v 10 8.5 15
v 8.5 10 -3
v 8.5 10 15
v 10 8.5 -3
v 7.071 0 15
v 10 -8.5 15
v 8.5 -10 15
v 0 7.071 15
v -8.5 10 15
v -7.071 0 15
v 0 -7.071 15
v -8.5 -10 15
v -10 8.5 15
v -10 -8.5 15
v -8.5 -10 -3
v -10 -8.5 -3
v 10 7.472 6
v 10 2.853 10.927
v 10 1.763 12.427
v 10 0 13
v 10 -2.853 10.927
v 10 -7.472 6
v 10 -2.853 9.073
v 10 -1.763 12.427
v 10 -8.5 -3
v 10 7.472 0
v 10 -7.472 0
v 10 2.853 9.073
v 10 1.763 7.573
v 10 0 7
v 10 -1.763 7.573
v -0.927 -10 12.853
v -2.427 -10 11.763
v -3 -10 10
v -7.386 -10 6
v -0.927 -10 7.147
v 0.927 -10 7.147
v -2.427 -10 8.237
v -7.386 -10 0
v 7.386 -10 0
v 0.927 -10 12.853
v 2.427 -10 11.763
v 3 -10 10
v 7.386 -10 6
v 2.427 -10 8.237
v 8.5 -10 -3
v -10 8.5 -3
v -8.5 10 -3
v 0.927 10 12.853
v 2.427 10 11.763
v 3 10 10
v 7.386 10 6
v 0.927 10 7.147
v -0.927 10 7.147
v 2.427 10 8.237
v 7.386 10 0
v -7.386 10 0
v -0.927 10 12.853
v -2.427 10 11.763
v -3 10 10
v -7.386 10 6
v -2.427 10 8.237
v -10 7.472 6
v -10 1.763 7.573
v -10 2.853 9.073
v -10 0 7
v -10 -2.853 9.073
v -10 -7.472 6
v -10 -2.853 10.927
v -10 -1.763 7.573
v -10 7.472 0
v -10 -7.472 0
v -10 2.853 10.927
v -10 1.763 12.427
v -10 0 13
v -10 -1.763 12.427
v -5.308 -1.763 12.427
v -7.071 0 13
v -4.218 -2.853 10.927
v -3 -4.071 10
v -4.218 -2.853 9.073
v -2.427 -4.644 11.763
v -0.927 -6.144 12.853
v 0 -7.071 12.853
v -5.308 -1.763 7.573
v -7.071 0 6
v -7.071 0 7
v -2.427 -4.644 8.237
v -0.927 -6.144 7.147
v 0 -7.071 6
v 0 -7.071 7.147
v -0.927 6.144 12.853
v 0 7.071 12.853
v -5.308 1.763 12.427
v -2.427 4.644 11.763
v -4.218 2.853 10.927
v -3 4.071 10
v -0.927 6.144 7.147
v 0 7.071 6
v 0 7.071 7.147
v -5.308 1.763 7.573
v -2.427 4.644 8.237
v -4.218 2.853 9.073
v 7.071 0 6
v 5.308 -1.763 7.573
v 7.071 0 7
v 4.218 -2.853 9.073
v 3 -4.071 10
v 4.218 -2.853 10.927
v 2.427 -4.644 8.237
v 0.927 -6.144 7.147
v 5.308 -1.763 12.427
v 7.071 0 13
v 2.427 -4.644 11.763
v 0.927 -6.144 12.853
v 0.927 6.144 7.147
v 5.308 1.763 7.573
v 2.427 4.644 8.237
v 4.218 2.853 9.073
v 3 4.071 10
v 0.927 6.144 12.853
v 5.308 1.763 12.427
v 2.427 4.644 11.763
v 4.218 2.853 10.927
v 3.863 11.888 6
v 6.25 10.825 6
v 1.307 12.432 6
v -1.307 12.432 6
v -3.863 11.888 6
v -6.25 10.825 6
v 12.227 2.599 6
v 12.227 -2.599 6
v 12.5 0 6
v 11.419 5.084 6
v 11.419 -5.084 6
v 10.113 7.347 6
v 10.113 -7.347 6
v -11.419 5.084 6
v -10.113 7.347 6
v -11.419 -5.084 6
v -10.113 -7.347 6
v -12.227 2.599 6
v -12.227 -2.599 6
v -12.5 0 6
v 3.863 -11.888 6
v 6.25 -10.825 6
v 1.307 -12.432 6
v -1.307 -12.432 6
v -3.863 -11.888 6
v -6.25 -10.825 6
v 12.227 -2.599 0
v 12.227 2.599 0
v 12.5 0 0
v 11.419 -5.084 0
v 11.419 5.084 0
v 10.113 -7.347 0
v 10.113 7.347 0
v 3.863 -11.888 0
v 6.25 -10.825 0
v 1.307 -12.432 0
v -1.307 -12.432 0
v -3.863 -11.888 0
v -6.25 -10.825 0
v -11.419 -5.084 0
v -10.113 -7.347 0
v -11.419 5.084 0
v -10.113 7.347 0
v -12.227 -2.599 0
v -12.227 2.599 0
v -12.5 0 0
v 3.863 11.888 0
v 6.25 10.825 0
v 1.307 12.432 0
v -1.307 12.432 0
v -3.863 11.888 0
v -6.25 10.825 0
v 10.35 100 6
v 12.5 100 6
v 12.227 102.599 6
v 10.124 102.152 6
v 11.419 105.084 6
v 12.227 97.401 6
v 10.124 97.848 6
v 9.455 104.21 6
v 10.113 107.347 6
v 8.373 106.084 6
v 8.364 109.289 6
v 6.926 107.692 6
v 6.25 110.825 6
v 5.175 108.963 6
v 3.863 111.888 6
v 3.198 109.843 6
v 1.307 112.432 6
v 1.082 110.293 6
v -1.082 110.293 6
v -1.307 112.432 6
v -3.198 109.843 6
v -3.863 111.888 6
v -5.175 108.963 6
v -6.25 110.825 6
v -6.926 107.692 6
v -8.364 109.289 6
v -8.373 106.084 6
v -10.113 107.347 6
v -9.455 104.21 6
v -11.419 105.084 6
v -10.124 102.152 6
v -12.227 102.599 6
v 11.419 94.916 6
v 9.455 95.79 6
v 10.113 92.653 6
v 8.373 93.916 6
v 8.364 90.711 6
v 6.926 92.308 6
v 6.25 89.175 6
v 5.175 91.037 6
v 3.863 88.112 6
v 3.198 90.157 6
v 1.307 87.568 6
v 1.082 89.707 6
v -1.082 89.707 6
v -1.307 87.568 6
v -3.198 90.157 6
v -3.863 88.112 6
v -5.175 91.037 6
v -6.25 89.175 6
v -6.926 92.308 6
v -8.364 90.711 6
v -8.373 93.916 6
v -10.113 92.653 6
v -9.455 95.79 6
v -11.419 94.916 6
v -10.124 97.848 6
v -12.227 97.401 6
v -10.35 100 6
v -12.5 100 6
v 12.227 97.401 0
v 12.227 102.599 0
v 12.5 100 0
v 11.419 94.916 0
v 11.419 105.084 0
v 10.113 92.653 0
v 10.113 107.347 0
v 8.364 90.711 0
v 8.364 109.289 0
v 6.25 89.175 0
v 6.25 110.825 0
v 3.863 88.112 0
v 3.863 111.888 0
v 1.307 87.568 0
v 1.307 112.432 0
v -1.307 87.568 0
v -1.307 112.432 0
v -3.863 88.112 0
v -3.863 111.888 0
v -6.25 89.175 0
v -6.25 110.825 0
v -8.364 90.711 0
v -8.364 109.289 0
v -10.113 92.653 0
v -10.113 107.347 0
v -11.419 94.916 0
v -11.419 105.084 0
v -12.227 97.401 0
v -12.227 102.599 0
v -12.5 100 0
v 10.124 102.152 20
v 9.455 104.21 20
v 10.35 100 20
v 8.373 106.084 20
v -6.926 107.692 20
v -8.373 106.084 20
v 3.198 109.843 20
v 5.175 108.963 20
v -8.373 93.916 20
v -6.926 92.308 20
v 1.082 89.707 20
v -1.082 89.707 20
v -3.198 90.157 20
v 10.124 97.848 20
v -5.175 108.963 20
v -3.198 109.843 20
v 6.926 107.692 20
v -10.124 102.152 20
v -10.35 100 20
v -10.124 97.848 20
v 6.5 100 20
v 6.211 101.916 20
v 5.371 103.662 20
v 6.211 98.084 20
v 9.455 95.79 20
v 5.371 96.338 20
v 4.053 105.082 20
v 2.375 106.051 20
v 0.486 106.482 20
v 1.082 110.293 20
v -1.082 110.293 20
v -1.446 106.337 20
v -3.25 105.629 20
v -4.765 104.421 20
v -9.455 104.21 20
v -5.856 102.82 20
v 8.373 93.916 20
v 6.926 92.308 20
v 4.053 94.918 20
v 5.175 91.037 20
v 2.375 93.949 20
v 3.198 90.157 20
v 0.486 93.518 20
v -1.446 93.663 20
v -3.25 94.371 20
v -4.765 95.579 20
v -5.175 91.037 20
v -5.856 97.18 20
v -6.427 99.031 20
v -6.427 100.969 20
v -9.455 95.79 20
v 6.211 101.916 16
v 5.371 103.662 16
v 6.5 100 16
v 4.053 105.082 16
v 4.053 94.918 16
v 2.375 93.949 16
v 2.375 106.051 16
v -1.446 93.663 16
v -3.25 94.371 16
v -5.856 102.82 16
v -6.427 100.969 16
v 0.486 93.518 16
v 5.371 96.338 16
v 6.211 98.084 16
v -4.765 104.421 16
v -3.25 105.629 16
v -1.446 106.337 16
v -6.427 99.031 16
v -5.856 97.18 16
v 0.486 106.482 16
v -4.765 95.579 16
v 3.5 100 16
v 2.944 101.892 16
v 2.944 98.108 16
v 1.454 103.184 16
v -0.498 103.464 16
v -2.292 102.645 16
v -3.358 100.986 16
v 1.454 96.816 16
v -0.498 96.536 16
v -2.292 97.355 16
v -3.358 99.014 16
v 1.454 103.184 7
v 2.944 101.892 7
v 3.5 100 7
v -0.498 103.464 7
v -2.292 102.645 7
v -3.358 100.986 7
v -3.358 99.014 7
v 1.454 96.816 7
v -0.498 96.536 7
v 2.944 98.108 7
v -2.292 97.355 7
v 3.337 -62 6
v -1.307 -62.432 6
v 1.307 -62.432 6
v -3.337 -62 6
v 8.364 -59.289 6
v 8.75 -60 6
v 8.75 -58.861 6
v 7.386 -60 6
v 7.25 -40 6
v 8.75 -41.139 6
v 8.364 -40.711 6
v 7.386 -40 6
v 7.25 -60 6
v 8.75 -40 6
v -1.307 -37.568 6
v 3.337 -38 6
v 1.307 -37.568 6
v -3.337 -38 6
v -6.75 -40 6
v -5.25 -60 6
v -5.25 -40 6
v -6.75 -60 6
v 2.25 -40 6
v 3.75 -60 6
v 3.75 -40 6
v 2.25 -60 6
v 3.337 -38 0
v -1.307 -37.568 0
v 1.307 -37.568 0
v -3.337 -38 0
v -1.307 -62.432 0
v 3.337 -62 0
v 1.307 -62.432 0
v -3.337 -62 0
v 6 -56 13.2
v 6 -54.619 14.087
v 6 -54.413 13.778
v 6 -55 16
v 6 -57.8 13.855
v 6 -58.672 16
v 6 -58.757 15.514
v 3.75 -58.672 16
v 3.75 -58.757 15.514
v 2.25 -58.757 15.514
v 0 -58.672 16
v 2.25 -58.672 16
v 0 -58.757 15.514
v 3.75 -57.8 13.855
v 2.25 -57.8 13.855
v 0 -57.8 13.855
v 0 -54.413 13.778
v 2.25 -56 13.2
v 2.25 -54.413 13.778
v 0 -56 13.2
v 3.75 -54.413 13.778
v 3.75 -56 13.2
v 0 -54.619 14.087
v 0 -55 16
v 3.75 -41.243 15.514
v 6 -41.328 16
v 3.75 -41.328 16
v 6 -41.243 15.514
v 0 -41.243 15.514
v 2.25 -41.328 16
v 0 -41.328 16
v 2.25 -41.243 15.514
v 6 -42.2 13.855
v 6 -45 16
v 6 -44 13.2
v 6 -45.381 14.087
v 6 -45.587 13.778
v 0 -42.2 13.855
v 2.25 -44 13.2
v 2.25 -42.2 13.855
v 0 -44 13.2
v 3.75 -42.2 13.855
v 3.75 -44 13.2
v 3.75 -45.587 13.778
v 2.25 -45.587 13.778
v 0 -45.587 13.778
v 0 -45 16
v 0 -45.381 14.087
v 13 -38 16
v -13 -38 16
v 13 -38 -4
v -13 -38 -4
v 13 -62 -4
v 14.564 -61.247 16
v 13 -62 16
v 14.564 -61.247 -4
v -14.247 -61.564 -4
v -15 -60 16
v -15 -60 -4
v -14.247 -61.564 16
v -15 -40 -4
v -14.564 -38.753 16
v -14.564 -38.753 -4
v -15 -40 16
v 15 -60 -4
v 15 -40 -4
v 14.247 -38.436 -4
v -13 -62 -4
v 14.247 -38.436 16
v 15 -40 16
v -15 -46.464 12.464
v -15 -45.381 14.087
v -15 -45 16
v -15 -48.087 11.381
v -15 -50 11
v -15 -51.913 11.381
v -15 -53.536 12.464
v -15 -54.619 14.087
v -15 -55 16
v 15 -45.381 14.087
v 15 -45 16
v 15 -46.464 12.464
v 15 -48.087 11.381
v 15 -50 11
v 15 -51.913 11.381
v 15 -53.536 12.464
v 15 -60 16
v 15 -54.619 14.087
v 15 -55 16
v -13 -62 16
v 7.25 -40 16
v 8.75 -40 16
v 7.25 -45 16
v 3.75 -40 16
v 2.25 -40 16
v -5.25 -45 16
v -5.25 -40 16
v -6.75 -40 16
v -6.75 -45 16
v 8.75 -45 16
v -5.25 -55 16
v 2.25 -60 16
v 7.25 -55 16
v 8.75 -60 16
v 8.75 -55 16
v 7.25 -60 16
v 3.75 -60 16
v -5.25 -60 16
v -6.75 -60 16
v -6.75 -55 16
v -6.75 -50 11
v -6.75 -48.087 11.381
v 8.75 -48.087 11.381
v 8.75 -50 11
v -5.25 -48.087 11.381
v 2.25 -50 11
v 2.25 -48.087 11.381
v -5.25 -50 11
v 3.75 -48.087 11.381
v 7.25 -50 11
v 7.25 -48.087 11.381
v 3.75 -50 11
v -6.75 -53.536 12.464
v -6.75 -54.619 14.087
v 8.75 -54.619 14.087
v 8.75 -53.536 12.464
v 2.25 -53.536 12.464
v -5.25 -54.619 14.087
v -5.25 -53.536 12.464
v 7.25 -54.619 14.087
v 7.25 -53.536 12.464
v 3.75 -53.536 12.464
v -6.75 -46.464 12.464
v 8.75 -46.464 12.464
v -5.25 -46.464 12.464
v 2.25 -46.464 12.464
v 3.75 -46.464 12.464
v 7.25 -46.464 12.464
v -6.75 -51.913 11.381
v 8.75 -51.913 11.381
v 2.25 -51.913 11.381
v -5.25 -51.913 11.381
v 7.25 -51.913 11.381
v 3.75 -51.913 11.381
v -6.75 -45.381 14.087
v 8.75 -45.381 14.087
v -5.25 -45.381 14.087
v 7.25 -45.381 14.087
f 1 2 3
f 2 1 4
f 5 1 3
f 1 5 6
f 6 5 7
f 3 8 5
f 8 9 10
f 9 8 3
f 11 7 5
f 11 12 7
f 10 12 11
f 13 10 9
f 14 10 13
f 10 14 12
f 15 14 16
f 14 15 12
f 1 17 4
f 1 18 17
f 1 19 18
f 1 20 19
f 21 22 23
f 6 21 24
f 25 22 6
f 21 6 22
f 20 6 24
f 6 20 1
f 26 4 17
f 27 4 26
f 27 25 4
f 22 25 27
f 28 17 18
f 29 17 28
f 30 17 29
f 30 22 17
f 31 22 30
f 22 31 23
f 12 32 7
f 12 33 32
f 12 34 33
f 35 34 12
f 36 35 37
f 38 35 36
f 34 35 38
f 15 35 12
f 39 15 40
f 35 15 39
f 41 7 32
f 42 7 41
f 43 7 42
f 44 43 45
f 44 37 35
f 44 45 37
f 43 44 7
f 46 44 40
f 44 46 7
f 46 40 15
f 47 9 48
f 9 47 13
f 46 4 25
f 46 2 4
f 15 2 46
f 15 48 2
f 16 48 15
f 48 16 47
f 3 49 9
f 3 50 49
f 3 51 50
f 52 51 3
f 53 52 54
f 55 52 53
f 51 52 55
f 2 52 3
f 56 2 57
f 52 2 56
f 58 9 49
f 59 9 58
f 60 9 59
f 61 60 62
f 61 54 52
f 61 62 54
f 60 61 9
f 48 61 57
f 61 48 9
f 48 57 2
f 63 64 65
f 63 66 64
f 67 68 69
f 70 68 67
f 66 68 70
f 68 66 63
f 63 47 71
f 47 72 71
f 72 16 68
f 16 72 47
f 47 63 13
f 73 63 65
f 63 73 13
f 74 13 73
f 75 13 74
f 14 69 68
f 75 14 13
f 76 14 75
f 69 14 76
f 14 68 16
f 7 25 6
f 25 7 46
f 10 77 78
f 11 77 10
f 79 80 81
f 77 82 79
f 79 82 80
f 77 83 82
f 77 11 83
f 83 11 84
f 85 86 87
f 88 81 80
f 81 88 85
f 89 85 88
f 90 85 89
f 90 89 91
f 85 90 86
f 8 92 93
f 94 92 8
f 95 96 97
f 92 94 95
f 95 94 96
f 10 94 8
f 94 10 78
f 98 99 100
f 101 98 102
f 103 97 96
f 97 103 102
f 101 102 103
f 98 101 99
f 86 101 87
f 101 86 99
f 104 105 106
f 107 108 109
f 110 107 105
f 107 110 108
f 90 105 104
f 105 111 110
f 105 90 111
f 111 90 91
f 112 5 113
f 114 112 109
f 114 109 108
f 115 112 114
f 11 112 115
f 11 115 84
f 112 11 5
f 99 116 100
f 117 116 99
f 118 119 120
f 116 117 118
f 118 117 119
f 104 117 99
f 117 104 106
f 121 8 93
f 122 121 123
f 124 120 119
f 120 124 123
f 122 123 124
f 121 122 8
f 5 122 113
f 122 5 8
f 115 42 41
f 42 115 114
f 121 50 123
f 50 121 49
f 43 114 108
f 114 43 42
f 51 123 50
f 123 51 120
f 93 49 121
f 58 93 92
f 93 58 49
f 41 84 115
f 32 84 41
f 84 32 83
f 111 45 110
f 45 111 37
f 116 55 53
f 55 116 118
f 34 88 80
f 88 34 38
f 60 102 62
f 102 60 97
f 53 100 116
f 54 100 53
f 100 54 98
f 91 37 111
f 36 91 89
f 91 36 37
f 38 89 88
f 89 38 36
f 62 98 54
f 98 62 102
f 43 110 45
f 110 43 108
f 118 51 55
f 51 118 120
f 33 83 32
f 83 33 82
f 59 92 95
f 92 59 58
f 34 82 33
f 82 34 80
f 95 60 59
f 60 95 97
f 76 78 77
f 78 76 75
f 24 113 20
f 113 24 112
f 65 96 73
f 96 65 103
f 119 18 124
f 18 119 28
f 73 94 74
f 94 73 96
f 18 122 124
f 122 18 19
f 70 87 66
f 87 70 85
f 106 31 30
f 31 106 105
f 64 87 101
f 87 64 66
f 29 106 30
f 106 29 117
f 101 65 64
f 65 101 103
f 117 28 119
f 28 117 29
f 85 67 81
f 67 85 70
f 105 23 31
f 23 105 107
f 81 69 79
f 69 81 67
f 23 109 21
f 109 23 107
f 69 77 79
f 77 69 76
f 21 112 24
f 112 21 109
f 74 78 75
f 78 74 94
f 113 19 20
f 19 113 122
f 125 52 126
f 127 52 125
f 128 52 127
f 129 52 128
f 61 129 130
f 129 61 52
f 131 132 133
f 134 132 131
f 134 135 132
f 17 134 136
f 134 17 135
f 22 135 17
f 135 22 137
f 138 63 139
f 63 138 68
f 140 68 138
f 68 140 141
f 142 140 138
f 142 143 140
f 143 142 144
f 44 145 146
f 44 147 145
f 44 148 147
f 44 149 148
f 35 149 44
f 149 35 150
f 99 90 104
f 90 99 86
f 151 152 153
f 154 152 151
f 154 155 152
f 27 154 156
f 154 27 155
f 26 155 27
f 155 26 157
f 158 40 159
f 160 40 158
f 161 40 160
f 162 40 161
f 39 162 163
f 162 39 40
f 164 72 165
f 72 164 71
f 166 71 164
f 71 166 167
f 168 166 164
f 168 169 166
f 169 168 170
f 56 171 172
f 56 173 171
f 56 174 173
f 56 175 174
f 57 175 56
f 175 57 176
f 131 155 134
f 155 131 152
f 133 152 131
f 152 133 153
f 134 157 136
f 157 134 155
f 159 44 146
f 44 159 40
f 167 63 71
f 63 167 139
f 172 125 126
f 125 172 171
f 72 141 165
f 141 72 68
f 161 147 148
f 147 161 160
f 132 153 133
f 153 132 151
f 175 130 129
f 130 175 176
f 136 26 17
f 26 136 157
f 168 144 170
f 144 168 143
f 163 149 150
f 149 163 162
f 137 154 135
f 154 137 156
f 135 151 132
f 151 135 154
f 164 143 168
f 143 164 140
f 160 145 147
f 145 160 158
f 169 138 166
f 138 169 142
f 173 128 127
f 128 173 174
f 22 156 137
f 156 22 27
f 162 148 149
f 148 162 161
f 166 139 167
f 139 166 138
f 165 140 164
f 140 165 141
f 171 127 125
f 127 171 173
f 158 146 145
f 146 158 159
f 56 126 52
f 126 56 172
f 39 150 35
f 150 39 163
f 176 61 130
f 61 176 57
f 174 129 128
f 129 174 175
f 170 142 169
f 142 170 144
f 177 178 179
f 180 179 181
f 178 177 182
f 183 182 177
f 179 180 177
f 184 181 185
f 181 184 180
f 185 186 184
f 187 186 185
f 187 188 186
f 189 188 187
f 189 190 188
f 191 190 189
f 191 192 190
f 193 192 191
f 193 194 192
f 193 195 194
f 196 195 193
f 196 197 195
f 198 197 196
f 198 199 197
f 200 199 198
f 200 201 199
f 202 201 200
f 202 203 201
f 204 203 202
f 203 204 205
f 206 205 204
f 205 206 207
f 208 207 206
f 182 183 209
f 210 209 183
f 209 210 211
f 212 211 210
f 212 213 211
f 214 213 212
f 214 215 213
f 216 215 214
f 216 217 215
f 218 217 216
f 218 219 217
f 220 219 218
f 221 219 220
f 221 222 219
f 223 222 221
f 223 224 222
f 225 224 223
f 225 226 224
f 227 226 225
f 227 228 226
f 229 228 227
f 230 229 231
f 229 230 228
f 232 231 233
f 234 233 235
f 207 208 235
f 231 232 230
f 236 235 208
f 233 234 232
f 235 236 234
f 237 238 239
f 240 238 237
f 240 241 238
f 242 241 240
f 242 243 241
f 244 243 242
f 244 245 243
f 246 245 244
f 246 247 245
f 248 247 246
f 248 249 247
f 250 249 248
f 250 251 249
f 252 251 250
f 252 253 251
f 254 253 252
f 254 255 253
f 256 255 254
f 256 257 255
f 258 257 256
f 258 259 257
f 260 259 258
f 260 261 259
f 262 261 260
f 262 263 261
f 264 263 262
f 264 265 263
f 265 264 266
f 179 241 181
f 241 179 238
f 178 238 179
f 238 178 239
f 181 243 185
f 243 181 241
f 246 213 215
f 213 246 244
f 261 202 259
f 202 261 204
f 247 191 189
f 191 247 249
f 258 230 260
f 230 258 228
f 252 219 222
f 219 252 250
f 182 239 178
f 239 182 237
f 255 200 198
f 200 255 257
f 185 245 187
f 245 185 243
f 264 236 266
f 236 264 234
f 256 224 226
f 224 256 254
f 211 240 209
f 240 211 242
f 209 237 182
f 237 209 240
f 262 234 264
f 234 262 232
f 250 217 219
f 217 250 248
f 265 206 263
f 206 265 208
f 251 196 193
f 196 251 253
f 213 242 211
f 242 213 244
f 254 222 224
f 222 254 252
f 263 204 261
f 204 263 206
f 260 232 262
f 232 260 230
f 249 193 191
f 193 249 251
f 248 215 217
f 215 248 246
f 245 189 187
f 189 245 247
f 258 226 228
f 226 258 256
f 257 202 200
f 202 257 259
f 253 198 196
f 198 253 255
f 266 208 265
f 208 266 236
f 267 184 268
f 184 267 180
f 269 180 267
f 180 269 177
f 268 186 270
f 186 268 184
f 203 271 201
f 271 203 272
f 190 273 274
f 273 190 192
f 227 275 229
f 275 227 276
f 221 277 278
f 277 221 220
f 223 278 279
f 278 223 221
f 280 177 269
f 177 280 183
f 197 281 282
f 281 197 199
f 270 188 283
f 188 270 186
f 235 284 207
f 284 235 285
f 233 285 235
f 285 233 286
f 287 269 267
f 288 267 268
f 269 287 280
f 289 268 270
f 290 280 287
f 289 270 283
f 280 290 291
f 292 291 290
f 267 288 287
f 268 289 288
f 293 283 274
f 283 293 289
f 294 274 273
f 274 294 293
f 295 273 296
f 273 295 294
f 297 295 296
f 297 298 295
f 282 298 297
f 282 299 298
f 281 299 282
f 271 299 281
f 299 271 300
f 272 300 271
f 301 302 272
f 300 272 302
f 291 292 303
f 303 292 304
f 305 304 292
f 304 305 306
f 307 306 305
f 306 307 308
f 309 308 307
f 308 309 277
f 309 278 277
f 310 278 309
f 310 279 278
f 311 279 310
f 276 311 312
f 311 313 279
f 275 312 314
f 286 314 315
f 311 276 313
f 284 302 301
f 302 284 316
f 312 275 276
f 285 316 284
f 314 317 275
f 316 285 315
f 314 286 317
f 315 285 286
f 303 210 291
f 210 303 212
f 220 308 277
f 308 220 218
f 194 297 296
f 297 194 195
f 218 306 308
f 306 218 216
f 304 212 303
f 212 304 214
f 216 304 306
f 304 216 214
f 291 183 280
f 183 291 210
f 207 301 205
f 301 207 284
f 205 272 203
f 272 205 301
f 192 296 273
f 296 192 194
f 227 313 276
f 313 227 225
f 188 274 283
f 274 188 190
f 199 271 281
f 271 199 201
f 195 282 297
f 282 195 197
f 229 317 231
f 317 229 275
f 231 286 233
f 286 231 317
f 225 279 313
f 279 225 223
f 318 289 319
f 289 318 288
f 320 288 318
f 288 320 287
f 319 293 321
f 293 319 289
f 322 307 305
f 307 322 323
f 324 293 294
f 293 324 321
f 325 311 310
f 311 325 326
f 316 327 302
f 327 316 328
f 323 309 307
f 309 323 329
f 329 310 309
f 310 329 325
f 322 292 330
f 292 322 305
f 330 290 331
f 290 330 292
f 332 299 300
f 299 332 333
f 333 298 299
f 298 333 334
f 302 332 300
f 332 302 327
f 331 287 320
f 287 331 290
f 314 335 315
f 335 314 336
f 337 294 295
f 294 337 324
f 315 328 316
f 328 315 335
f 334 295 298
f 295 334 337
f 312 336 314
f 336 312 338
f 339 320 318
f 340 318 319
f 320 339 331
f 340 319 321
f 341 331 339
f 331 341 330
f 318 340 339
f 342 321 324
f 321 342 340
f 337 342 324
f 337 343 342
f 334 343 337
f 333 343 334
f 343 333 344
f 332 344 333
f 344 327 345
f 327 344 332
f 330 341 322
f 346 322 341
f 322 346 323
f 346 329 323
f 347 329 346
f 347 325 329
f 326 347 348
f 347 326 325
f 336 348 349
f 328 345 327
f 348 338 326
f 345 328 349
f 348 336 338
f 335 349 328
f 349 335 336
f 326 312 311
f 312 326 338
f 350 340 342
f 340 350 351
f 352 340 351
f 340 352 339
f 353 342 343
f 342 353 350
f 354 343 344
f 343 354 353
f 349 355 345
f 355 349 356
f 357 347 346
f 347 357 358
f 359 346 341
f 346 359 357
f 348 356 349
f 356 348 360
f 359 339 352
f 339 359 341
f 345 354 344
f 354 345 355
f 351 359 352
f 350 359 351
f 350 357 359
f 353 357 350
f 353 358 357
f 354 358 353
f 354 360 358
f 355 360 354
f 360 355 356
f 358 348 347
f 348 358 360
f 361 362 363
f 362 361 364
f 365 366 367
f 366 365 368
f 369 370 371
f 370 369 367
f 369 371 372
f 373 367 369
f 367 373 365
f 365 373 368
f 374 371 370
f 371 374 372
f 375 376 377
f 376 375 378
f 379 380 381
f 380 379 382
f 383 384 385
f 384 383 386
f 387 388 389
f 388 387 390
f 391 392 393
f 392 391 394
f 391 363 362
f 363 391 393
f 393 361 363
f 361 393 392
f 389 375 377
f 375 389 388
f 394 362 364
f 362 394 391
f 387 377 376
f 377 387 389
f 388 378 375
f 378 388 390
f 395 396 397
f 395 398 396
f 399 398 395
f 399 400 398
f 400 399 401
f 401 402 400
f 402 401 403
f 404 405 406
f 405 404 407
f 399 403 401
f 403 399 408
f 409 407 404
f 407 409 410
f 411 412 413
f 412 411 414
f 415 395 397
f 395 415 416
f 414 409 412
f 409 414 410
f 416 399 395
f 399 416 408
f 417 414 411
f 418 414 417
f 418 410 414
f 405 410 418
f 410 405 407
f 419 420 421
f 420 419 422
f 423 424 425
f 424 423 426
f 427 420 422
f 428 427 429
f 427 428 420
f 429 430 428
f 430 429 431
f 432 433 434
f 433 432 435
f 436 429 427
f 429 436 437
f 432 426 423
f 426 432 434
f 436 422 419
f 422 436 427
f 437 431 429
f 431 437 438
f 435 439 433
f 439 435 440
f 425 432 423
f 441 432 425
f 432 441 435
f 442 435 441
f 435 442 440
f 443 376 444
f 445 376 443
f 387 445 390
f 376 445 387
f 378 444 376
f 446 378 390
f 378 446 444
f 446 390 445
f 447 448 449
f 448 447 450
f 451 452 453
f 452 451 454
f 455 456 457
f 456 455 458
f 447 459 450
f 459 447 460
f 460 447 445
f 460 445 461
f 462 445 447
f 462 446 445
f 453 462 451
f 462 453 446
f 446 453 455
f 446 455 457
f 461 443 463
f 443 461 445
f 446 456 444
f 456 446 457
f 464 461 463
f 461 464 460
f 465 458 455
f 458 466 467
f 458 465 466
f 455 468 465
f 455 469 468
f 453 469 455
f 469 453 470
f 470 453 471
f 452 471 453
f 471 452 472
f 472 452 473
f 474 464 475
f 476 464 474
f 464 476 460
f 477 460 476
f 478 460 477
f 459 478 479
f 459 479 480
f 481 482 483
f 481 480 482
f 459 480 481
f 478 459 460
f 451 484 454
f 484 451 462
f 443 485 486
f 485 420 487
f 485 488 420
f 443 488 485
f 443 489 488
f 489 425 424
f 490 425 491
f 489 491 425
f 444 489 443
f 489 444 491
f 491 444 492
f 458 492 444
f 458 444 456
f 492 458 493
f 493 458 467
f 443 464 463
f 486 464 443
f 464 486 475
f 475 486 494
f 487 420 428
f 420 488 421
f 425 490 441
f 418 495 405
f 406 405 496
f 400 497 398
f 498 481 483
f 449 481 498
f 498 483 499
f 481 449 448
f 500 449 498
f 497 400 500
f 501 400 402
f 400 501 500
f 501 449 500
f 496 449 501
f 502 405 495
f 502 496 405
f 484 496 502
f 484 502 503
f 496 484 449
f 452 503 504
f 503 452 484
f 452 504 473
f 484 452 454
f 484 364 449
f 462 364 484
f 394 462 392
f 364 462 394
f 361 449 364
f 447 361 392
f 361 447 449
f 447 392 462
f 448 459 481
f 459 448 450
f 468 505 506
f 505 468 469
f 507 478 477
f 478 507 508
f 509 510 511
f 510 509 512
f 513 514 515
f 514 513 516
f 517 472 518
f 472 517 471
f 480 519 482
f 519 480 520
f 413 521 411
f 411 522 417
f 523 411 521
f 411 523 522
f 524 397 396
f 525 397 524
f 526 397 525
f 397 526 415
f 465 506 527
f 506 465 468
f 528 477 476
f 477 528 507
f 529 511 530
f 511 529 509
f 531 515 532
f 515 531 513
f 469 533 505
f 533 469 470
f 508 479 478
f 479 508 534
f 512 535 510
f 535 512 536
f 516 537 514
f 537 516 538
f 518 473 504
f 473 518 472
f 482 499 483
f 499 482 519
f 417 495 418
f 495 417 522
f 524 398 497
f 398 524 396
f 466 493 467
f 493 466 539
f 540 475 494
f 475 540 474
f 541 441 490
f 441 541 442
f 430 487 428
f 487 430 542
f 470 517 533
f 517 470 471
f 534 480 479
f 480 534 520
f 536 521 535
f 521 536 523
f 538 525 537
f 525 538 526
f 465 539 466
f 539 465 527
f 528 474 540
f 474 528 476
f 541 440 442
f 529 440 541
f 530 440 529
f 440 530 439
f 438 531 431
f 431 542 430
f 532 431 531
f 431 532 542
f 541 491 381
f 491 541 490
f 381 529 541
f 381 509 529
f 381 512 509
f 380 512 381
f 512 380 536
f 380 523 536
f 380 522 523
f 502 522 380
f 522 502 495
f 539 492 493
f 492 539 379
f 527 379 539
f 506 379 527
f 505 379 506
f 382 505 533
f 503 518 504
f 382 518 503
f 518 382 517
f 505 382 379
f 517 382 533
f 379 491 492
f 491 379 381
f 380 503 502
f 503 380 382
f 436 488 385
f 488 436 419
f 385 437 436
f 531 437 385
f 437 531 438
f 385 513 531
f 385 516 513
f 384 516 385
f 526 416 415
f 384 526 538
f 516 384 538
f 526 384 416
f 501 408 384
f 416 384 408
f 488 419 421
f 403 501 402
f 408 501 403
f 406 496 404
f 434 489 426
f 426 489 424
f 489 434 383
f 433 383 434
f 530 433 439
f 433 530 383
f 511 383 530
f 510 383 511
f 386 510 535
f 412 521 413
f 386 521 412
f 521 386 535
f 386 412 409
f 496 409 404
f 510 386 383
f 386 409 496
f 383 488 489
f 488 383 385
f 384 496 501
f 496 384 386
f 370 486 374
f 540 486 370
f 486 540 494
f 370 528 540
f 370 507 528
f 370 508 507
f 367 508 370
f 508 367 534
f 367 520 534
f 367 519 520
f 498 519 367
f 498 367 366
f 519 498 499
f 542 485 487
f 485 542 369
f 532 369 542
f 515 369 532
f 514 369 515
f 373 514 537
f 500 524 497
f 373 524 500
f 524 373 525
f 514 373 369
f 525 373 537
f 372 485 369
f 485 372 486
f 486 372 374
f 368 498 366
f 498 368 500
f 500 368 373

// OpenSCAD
// file: ../util.scad
// mapscam — tiny geometry helpers, no external deps.

// Rounded rectangular prism, centred in X/Y, sitting on z=0..h.
module rprism(x, y, h, r = 2) {
    r2 = min(r, x/2 - 0.01, y/2 - 0.01);
    linear_extrude(height = h)
        offset(r = r2) square([x - 2*r2, y - 2*r2], center = true);
}

// Same but centred on the origin in all axes.
module rprism_c(x, y, h, r = 2) {
    translate([0, 0, -h/2]) rprism(x, y, h, r);
}
// main file
// mapscam — vibrometer PHASE 2 SKETCH ONLY (Michelson homodyne quadrature).
//
// Rough geometry to confirm a bench layout fits a 25 mm optical-breadboard grid.
// NOT build-ready and NOT part of the `vibrometer` component's parts list — it is
// excluded from `make check`. The detailed models (kinematic BS-cube holder,
// PZT reference-mirror cell, quadrature detector cluster with a lambda/4 plate +
// two polariser slots + 2-3 BPW34s) are deferred to the Phase-2 build.
// See docs/vibrometer/design-notes.md.

use <../util.scad>

grid = 25;          // breadboard hole pitch (mm)
post_d = 12.7;      // 1/2" optical post
base_t = 6;

module bench_post(h = 30) {
    cylinder(h = h, d = post_d);
    cylinder(h = base_t, d = 25);
}

module bs_cube_holder(cube_mm = 10) {
    difference() {
        translate([0, 0, base_t]) rprism_c(cube_mm + 10, cube_mm + 10, cube_mm + 8, r = 1.5);
        translate([0, 0, base_t + 4])
            rotate([0, 0, 45]) cube([cube_mm, cube_mm, cube_mm + 4], center = true);
        translate([0, 0, base_t + 4]) rotate([90, 0, 0]) cylinder(h = 40, d = 6, center = true);
        translate([0, 0, base_t + 4]) rotate([0, 90, 0]) cylinder(h = 40, d = 6, center = true);
    }
    bench_post(base_t);
}

module pzt_mirror_cell(mirror_d = 12.7) {
    difference() {
        translate([0, 0, base_t]) cylinder(h = 14, d = mirror_d + 8);
        translate([0, 0, base_t + 10]) cylinder(h = 6, d = mirror_d + 0.3);   // mirror seat
        translate([0, 0, base_t + 1]) cylinder(h = 9, d = 7.0);               // PZT stack bore
    }
    bench_post(base_t);
}

module quad_detector_cluster() {
    difference() {
        translate([0, 0, base_t]) rprism_c(30, 24, 20, r = 2);
        translate([0, 0, base_t + 10]) rotate([0, 90, 0]) cylinder(h = 32, d = 10, center = true); // beam bore
        for (s = [-1, 1])
            translate([0, s * 6, base_t + 10]) rotate([0, 90, 0]) cylinder(h = 6, d = 5.6);        // BPW34 pockets
        translate([-6, 0, base_t + 10]) cube([1.5, 20, 20], center = true);   // lambda/4 plate slot
        translate([ 3, 0, base_t + 10]) cube([1.5, 20, 20], center = true);   // polariser slot A
        translate([ 8, 0, base_t + 10]) cube([1.5, 20, 20], center = true);   // polariser slot B
    }
    bench_post(base_t);
}

// Indicative layout on the grid (source -> BS -> {ref arm, target arm} -> detector).
module vib_michelson_layout() {
    translate([0,        0, 0]) bs_cube_holder();
    translate([0,  4*grid, 0]) pzt_mirror_cell();          // reference arm
    translate([4*grid,   0, 0]) %cylinder(h = 5, d = 3);   // target arm exit (to bench)
    translate([0, -2*grid, 0]) quad_detector_cluster();
}

vib_michelson_layout();
